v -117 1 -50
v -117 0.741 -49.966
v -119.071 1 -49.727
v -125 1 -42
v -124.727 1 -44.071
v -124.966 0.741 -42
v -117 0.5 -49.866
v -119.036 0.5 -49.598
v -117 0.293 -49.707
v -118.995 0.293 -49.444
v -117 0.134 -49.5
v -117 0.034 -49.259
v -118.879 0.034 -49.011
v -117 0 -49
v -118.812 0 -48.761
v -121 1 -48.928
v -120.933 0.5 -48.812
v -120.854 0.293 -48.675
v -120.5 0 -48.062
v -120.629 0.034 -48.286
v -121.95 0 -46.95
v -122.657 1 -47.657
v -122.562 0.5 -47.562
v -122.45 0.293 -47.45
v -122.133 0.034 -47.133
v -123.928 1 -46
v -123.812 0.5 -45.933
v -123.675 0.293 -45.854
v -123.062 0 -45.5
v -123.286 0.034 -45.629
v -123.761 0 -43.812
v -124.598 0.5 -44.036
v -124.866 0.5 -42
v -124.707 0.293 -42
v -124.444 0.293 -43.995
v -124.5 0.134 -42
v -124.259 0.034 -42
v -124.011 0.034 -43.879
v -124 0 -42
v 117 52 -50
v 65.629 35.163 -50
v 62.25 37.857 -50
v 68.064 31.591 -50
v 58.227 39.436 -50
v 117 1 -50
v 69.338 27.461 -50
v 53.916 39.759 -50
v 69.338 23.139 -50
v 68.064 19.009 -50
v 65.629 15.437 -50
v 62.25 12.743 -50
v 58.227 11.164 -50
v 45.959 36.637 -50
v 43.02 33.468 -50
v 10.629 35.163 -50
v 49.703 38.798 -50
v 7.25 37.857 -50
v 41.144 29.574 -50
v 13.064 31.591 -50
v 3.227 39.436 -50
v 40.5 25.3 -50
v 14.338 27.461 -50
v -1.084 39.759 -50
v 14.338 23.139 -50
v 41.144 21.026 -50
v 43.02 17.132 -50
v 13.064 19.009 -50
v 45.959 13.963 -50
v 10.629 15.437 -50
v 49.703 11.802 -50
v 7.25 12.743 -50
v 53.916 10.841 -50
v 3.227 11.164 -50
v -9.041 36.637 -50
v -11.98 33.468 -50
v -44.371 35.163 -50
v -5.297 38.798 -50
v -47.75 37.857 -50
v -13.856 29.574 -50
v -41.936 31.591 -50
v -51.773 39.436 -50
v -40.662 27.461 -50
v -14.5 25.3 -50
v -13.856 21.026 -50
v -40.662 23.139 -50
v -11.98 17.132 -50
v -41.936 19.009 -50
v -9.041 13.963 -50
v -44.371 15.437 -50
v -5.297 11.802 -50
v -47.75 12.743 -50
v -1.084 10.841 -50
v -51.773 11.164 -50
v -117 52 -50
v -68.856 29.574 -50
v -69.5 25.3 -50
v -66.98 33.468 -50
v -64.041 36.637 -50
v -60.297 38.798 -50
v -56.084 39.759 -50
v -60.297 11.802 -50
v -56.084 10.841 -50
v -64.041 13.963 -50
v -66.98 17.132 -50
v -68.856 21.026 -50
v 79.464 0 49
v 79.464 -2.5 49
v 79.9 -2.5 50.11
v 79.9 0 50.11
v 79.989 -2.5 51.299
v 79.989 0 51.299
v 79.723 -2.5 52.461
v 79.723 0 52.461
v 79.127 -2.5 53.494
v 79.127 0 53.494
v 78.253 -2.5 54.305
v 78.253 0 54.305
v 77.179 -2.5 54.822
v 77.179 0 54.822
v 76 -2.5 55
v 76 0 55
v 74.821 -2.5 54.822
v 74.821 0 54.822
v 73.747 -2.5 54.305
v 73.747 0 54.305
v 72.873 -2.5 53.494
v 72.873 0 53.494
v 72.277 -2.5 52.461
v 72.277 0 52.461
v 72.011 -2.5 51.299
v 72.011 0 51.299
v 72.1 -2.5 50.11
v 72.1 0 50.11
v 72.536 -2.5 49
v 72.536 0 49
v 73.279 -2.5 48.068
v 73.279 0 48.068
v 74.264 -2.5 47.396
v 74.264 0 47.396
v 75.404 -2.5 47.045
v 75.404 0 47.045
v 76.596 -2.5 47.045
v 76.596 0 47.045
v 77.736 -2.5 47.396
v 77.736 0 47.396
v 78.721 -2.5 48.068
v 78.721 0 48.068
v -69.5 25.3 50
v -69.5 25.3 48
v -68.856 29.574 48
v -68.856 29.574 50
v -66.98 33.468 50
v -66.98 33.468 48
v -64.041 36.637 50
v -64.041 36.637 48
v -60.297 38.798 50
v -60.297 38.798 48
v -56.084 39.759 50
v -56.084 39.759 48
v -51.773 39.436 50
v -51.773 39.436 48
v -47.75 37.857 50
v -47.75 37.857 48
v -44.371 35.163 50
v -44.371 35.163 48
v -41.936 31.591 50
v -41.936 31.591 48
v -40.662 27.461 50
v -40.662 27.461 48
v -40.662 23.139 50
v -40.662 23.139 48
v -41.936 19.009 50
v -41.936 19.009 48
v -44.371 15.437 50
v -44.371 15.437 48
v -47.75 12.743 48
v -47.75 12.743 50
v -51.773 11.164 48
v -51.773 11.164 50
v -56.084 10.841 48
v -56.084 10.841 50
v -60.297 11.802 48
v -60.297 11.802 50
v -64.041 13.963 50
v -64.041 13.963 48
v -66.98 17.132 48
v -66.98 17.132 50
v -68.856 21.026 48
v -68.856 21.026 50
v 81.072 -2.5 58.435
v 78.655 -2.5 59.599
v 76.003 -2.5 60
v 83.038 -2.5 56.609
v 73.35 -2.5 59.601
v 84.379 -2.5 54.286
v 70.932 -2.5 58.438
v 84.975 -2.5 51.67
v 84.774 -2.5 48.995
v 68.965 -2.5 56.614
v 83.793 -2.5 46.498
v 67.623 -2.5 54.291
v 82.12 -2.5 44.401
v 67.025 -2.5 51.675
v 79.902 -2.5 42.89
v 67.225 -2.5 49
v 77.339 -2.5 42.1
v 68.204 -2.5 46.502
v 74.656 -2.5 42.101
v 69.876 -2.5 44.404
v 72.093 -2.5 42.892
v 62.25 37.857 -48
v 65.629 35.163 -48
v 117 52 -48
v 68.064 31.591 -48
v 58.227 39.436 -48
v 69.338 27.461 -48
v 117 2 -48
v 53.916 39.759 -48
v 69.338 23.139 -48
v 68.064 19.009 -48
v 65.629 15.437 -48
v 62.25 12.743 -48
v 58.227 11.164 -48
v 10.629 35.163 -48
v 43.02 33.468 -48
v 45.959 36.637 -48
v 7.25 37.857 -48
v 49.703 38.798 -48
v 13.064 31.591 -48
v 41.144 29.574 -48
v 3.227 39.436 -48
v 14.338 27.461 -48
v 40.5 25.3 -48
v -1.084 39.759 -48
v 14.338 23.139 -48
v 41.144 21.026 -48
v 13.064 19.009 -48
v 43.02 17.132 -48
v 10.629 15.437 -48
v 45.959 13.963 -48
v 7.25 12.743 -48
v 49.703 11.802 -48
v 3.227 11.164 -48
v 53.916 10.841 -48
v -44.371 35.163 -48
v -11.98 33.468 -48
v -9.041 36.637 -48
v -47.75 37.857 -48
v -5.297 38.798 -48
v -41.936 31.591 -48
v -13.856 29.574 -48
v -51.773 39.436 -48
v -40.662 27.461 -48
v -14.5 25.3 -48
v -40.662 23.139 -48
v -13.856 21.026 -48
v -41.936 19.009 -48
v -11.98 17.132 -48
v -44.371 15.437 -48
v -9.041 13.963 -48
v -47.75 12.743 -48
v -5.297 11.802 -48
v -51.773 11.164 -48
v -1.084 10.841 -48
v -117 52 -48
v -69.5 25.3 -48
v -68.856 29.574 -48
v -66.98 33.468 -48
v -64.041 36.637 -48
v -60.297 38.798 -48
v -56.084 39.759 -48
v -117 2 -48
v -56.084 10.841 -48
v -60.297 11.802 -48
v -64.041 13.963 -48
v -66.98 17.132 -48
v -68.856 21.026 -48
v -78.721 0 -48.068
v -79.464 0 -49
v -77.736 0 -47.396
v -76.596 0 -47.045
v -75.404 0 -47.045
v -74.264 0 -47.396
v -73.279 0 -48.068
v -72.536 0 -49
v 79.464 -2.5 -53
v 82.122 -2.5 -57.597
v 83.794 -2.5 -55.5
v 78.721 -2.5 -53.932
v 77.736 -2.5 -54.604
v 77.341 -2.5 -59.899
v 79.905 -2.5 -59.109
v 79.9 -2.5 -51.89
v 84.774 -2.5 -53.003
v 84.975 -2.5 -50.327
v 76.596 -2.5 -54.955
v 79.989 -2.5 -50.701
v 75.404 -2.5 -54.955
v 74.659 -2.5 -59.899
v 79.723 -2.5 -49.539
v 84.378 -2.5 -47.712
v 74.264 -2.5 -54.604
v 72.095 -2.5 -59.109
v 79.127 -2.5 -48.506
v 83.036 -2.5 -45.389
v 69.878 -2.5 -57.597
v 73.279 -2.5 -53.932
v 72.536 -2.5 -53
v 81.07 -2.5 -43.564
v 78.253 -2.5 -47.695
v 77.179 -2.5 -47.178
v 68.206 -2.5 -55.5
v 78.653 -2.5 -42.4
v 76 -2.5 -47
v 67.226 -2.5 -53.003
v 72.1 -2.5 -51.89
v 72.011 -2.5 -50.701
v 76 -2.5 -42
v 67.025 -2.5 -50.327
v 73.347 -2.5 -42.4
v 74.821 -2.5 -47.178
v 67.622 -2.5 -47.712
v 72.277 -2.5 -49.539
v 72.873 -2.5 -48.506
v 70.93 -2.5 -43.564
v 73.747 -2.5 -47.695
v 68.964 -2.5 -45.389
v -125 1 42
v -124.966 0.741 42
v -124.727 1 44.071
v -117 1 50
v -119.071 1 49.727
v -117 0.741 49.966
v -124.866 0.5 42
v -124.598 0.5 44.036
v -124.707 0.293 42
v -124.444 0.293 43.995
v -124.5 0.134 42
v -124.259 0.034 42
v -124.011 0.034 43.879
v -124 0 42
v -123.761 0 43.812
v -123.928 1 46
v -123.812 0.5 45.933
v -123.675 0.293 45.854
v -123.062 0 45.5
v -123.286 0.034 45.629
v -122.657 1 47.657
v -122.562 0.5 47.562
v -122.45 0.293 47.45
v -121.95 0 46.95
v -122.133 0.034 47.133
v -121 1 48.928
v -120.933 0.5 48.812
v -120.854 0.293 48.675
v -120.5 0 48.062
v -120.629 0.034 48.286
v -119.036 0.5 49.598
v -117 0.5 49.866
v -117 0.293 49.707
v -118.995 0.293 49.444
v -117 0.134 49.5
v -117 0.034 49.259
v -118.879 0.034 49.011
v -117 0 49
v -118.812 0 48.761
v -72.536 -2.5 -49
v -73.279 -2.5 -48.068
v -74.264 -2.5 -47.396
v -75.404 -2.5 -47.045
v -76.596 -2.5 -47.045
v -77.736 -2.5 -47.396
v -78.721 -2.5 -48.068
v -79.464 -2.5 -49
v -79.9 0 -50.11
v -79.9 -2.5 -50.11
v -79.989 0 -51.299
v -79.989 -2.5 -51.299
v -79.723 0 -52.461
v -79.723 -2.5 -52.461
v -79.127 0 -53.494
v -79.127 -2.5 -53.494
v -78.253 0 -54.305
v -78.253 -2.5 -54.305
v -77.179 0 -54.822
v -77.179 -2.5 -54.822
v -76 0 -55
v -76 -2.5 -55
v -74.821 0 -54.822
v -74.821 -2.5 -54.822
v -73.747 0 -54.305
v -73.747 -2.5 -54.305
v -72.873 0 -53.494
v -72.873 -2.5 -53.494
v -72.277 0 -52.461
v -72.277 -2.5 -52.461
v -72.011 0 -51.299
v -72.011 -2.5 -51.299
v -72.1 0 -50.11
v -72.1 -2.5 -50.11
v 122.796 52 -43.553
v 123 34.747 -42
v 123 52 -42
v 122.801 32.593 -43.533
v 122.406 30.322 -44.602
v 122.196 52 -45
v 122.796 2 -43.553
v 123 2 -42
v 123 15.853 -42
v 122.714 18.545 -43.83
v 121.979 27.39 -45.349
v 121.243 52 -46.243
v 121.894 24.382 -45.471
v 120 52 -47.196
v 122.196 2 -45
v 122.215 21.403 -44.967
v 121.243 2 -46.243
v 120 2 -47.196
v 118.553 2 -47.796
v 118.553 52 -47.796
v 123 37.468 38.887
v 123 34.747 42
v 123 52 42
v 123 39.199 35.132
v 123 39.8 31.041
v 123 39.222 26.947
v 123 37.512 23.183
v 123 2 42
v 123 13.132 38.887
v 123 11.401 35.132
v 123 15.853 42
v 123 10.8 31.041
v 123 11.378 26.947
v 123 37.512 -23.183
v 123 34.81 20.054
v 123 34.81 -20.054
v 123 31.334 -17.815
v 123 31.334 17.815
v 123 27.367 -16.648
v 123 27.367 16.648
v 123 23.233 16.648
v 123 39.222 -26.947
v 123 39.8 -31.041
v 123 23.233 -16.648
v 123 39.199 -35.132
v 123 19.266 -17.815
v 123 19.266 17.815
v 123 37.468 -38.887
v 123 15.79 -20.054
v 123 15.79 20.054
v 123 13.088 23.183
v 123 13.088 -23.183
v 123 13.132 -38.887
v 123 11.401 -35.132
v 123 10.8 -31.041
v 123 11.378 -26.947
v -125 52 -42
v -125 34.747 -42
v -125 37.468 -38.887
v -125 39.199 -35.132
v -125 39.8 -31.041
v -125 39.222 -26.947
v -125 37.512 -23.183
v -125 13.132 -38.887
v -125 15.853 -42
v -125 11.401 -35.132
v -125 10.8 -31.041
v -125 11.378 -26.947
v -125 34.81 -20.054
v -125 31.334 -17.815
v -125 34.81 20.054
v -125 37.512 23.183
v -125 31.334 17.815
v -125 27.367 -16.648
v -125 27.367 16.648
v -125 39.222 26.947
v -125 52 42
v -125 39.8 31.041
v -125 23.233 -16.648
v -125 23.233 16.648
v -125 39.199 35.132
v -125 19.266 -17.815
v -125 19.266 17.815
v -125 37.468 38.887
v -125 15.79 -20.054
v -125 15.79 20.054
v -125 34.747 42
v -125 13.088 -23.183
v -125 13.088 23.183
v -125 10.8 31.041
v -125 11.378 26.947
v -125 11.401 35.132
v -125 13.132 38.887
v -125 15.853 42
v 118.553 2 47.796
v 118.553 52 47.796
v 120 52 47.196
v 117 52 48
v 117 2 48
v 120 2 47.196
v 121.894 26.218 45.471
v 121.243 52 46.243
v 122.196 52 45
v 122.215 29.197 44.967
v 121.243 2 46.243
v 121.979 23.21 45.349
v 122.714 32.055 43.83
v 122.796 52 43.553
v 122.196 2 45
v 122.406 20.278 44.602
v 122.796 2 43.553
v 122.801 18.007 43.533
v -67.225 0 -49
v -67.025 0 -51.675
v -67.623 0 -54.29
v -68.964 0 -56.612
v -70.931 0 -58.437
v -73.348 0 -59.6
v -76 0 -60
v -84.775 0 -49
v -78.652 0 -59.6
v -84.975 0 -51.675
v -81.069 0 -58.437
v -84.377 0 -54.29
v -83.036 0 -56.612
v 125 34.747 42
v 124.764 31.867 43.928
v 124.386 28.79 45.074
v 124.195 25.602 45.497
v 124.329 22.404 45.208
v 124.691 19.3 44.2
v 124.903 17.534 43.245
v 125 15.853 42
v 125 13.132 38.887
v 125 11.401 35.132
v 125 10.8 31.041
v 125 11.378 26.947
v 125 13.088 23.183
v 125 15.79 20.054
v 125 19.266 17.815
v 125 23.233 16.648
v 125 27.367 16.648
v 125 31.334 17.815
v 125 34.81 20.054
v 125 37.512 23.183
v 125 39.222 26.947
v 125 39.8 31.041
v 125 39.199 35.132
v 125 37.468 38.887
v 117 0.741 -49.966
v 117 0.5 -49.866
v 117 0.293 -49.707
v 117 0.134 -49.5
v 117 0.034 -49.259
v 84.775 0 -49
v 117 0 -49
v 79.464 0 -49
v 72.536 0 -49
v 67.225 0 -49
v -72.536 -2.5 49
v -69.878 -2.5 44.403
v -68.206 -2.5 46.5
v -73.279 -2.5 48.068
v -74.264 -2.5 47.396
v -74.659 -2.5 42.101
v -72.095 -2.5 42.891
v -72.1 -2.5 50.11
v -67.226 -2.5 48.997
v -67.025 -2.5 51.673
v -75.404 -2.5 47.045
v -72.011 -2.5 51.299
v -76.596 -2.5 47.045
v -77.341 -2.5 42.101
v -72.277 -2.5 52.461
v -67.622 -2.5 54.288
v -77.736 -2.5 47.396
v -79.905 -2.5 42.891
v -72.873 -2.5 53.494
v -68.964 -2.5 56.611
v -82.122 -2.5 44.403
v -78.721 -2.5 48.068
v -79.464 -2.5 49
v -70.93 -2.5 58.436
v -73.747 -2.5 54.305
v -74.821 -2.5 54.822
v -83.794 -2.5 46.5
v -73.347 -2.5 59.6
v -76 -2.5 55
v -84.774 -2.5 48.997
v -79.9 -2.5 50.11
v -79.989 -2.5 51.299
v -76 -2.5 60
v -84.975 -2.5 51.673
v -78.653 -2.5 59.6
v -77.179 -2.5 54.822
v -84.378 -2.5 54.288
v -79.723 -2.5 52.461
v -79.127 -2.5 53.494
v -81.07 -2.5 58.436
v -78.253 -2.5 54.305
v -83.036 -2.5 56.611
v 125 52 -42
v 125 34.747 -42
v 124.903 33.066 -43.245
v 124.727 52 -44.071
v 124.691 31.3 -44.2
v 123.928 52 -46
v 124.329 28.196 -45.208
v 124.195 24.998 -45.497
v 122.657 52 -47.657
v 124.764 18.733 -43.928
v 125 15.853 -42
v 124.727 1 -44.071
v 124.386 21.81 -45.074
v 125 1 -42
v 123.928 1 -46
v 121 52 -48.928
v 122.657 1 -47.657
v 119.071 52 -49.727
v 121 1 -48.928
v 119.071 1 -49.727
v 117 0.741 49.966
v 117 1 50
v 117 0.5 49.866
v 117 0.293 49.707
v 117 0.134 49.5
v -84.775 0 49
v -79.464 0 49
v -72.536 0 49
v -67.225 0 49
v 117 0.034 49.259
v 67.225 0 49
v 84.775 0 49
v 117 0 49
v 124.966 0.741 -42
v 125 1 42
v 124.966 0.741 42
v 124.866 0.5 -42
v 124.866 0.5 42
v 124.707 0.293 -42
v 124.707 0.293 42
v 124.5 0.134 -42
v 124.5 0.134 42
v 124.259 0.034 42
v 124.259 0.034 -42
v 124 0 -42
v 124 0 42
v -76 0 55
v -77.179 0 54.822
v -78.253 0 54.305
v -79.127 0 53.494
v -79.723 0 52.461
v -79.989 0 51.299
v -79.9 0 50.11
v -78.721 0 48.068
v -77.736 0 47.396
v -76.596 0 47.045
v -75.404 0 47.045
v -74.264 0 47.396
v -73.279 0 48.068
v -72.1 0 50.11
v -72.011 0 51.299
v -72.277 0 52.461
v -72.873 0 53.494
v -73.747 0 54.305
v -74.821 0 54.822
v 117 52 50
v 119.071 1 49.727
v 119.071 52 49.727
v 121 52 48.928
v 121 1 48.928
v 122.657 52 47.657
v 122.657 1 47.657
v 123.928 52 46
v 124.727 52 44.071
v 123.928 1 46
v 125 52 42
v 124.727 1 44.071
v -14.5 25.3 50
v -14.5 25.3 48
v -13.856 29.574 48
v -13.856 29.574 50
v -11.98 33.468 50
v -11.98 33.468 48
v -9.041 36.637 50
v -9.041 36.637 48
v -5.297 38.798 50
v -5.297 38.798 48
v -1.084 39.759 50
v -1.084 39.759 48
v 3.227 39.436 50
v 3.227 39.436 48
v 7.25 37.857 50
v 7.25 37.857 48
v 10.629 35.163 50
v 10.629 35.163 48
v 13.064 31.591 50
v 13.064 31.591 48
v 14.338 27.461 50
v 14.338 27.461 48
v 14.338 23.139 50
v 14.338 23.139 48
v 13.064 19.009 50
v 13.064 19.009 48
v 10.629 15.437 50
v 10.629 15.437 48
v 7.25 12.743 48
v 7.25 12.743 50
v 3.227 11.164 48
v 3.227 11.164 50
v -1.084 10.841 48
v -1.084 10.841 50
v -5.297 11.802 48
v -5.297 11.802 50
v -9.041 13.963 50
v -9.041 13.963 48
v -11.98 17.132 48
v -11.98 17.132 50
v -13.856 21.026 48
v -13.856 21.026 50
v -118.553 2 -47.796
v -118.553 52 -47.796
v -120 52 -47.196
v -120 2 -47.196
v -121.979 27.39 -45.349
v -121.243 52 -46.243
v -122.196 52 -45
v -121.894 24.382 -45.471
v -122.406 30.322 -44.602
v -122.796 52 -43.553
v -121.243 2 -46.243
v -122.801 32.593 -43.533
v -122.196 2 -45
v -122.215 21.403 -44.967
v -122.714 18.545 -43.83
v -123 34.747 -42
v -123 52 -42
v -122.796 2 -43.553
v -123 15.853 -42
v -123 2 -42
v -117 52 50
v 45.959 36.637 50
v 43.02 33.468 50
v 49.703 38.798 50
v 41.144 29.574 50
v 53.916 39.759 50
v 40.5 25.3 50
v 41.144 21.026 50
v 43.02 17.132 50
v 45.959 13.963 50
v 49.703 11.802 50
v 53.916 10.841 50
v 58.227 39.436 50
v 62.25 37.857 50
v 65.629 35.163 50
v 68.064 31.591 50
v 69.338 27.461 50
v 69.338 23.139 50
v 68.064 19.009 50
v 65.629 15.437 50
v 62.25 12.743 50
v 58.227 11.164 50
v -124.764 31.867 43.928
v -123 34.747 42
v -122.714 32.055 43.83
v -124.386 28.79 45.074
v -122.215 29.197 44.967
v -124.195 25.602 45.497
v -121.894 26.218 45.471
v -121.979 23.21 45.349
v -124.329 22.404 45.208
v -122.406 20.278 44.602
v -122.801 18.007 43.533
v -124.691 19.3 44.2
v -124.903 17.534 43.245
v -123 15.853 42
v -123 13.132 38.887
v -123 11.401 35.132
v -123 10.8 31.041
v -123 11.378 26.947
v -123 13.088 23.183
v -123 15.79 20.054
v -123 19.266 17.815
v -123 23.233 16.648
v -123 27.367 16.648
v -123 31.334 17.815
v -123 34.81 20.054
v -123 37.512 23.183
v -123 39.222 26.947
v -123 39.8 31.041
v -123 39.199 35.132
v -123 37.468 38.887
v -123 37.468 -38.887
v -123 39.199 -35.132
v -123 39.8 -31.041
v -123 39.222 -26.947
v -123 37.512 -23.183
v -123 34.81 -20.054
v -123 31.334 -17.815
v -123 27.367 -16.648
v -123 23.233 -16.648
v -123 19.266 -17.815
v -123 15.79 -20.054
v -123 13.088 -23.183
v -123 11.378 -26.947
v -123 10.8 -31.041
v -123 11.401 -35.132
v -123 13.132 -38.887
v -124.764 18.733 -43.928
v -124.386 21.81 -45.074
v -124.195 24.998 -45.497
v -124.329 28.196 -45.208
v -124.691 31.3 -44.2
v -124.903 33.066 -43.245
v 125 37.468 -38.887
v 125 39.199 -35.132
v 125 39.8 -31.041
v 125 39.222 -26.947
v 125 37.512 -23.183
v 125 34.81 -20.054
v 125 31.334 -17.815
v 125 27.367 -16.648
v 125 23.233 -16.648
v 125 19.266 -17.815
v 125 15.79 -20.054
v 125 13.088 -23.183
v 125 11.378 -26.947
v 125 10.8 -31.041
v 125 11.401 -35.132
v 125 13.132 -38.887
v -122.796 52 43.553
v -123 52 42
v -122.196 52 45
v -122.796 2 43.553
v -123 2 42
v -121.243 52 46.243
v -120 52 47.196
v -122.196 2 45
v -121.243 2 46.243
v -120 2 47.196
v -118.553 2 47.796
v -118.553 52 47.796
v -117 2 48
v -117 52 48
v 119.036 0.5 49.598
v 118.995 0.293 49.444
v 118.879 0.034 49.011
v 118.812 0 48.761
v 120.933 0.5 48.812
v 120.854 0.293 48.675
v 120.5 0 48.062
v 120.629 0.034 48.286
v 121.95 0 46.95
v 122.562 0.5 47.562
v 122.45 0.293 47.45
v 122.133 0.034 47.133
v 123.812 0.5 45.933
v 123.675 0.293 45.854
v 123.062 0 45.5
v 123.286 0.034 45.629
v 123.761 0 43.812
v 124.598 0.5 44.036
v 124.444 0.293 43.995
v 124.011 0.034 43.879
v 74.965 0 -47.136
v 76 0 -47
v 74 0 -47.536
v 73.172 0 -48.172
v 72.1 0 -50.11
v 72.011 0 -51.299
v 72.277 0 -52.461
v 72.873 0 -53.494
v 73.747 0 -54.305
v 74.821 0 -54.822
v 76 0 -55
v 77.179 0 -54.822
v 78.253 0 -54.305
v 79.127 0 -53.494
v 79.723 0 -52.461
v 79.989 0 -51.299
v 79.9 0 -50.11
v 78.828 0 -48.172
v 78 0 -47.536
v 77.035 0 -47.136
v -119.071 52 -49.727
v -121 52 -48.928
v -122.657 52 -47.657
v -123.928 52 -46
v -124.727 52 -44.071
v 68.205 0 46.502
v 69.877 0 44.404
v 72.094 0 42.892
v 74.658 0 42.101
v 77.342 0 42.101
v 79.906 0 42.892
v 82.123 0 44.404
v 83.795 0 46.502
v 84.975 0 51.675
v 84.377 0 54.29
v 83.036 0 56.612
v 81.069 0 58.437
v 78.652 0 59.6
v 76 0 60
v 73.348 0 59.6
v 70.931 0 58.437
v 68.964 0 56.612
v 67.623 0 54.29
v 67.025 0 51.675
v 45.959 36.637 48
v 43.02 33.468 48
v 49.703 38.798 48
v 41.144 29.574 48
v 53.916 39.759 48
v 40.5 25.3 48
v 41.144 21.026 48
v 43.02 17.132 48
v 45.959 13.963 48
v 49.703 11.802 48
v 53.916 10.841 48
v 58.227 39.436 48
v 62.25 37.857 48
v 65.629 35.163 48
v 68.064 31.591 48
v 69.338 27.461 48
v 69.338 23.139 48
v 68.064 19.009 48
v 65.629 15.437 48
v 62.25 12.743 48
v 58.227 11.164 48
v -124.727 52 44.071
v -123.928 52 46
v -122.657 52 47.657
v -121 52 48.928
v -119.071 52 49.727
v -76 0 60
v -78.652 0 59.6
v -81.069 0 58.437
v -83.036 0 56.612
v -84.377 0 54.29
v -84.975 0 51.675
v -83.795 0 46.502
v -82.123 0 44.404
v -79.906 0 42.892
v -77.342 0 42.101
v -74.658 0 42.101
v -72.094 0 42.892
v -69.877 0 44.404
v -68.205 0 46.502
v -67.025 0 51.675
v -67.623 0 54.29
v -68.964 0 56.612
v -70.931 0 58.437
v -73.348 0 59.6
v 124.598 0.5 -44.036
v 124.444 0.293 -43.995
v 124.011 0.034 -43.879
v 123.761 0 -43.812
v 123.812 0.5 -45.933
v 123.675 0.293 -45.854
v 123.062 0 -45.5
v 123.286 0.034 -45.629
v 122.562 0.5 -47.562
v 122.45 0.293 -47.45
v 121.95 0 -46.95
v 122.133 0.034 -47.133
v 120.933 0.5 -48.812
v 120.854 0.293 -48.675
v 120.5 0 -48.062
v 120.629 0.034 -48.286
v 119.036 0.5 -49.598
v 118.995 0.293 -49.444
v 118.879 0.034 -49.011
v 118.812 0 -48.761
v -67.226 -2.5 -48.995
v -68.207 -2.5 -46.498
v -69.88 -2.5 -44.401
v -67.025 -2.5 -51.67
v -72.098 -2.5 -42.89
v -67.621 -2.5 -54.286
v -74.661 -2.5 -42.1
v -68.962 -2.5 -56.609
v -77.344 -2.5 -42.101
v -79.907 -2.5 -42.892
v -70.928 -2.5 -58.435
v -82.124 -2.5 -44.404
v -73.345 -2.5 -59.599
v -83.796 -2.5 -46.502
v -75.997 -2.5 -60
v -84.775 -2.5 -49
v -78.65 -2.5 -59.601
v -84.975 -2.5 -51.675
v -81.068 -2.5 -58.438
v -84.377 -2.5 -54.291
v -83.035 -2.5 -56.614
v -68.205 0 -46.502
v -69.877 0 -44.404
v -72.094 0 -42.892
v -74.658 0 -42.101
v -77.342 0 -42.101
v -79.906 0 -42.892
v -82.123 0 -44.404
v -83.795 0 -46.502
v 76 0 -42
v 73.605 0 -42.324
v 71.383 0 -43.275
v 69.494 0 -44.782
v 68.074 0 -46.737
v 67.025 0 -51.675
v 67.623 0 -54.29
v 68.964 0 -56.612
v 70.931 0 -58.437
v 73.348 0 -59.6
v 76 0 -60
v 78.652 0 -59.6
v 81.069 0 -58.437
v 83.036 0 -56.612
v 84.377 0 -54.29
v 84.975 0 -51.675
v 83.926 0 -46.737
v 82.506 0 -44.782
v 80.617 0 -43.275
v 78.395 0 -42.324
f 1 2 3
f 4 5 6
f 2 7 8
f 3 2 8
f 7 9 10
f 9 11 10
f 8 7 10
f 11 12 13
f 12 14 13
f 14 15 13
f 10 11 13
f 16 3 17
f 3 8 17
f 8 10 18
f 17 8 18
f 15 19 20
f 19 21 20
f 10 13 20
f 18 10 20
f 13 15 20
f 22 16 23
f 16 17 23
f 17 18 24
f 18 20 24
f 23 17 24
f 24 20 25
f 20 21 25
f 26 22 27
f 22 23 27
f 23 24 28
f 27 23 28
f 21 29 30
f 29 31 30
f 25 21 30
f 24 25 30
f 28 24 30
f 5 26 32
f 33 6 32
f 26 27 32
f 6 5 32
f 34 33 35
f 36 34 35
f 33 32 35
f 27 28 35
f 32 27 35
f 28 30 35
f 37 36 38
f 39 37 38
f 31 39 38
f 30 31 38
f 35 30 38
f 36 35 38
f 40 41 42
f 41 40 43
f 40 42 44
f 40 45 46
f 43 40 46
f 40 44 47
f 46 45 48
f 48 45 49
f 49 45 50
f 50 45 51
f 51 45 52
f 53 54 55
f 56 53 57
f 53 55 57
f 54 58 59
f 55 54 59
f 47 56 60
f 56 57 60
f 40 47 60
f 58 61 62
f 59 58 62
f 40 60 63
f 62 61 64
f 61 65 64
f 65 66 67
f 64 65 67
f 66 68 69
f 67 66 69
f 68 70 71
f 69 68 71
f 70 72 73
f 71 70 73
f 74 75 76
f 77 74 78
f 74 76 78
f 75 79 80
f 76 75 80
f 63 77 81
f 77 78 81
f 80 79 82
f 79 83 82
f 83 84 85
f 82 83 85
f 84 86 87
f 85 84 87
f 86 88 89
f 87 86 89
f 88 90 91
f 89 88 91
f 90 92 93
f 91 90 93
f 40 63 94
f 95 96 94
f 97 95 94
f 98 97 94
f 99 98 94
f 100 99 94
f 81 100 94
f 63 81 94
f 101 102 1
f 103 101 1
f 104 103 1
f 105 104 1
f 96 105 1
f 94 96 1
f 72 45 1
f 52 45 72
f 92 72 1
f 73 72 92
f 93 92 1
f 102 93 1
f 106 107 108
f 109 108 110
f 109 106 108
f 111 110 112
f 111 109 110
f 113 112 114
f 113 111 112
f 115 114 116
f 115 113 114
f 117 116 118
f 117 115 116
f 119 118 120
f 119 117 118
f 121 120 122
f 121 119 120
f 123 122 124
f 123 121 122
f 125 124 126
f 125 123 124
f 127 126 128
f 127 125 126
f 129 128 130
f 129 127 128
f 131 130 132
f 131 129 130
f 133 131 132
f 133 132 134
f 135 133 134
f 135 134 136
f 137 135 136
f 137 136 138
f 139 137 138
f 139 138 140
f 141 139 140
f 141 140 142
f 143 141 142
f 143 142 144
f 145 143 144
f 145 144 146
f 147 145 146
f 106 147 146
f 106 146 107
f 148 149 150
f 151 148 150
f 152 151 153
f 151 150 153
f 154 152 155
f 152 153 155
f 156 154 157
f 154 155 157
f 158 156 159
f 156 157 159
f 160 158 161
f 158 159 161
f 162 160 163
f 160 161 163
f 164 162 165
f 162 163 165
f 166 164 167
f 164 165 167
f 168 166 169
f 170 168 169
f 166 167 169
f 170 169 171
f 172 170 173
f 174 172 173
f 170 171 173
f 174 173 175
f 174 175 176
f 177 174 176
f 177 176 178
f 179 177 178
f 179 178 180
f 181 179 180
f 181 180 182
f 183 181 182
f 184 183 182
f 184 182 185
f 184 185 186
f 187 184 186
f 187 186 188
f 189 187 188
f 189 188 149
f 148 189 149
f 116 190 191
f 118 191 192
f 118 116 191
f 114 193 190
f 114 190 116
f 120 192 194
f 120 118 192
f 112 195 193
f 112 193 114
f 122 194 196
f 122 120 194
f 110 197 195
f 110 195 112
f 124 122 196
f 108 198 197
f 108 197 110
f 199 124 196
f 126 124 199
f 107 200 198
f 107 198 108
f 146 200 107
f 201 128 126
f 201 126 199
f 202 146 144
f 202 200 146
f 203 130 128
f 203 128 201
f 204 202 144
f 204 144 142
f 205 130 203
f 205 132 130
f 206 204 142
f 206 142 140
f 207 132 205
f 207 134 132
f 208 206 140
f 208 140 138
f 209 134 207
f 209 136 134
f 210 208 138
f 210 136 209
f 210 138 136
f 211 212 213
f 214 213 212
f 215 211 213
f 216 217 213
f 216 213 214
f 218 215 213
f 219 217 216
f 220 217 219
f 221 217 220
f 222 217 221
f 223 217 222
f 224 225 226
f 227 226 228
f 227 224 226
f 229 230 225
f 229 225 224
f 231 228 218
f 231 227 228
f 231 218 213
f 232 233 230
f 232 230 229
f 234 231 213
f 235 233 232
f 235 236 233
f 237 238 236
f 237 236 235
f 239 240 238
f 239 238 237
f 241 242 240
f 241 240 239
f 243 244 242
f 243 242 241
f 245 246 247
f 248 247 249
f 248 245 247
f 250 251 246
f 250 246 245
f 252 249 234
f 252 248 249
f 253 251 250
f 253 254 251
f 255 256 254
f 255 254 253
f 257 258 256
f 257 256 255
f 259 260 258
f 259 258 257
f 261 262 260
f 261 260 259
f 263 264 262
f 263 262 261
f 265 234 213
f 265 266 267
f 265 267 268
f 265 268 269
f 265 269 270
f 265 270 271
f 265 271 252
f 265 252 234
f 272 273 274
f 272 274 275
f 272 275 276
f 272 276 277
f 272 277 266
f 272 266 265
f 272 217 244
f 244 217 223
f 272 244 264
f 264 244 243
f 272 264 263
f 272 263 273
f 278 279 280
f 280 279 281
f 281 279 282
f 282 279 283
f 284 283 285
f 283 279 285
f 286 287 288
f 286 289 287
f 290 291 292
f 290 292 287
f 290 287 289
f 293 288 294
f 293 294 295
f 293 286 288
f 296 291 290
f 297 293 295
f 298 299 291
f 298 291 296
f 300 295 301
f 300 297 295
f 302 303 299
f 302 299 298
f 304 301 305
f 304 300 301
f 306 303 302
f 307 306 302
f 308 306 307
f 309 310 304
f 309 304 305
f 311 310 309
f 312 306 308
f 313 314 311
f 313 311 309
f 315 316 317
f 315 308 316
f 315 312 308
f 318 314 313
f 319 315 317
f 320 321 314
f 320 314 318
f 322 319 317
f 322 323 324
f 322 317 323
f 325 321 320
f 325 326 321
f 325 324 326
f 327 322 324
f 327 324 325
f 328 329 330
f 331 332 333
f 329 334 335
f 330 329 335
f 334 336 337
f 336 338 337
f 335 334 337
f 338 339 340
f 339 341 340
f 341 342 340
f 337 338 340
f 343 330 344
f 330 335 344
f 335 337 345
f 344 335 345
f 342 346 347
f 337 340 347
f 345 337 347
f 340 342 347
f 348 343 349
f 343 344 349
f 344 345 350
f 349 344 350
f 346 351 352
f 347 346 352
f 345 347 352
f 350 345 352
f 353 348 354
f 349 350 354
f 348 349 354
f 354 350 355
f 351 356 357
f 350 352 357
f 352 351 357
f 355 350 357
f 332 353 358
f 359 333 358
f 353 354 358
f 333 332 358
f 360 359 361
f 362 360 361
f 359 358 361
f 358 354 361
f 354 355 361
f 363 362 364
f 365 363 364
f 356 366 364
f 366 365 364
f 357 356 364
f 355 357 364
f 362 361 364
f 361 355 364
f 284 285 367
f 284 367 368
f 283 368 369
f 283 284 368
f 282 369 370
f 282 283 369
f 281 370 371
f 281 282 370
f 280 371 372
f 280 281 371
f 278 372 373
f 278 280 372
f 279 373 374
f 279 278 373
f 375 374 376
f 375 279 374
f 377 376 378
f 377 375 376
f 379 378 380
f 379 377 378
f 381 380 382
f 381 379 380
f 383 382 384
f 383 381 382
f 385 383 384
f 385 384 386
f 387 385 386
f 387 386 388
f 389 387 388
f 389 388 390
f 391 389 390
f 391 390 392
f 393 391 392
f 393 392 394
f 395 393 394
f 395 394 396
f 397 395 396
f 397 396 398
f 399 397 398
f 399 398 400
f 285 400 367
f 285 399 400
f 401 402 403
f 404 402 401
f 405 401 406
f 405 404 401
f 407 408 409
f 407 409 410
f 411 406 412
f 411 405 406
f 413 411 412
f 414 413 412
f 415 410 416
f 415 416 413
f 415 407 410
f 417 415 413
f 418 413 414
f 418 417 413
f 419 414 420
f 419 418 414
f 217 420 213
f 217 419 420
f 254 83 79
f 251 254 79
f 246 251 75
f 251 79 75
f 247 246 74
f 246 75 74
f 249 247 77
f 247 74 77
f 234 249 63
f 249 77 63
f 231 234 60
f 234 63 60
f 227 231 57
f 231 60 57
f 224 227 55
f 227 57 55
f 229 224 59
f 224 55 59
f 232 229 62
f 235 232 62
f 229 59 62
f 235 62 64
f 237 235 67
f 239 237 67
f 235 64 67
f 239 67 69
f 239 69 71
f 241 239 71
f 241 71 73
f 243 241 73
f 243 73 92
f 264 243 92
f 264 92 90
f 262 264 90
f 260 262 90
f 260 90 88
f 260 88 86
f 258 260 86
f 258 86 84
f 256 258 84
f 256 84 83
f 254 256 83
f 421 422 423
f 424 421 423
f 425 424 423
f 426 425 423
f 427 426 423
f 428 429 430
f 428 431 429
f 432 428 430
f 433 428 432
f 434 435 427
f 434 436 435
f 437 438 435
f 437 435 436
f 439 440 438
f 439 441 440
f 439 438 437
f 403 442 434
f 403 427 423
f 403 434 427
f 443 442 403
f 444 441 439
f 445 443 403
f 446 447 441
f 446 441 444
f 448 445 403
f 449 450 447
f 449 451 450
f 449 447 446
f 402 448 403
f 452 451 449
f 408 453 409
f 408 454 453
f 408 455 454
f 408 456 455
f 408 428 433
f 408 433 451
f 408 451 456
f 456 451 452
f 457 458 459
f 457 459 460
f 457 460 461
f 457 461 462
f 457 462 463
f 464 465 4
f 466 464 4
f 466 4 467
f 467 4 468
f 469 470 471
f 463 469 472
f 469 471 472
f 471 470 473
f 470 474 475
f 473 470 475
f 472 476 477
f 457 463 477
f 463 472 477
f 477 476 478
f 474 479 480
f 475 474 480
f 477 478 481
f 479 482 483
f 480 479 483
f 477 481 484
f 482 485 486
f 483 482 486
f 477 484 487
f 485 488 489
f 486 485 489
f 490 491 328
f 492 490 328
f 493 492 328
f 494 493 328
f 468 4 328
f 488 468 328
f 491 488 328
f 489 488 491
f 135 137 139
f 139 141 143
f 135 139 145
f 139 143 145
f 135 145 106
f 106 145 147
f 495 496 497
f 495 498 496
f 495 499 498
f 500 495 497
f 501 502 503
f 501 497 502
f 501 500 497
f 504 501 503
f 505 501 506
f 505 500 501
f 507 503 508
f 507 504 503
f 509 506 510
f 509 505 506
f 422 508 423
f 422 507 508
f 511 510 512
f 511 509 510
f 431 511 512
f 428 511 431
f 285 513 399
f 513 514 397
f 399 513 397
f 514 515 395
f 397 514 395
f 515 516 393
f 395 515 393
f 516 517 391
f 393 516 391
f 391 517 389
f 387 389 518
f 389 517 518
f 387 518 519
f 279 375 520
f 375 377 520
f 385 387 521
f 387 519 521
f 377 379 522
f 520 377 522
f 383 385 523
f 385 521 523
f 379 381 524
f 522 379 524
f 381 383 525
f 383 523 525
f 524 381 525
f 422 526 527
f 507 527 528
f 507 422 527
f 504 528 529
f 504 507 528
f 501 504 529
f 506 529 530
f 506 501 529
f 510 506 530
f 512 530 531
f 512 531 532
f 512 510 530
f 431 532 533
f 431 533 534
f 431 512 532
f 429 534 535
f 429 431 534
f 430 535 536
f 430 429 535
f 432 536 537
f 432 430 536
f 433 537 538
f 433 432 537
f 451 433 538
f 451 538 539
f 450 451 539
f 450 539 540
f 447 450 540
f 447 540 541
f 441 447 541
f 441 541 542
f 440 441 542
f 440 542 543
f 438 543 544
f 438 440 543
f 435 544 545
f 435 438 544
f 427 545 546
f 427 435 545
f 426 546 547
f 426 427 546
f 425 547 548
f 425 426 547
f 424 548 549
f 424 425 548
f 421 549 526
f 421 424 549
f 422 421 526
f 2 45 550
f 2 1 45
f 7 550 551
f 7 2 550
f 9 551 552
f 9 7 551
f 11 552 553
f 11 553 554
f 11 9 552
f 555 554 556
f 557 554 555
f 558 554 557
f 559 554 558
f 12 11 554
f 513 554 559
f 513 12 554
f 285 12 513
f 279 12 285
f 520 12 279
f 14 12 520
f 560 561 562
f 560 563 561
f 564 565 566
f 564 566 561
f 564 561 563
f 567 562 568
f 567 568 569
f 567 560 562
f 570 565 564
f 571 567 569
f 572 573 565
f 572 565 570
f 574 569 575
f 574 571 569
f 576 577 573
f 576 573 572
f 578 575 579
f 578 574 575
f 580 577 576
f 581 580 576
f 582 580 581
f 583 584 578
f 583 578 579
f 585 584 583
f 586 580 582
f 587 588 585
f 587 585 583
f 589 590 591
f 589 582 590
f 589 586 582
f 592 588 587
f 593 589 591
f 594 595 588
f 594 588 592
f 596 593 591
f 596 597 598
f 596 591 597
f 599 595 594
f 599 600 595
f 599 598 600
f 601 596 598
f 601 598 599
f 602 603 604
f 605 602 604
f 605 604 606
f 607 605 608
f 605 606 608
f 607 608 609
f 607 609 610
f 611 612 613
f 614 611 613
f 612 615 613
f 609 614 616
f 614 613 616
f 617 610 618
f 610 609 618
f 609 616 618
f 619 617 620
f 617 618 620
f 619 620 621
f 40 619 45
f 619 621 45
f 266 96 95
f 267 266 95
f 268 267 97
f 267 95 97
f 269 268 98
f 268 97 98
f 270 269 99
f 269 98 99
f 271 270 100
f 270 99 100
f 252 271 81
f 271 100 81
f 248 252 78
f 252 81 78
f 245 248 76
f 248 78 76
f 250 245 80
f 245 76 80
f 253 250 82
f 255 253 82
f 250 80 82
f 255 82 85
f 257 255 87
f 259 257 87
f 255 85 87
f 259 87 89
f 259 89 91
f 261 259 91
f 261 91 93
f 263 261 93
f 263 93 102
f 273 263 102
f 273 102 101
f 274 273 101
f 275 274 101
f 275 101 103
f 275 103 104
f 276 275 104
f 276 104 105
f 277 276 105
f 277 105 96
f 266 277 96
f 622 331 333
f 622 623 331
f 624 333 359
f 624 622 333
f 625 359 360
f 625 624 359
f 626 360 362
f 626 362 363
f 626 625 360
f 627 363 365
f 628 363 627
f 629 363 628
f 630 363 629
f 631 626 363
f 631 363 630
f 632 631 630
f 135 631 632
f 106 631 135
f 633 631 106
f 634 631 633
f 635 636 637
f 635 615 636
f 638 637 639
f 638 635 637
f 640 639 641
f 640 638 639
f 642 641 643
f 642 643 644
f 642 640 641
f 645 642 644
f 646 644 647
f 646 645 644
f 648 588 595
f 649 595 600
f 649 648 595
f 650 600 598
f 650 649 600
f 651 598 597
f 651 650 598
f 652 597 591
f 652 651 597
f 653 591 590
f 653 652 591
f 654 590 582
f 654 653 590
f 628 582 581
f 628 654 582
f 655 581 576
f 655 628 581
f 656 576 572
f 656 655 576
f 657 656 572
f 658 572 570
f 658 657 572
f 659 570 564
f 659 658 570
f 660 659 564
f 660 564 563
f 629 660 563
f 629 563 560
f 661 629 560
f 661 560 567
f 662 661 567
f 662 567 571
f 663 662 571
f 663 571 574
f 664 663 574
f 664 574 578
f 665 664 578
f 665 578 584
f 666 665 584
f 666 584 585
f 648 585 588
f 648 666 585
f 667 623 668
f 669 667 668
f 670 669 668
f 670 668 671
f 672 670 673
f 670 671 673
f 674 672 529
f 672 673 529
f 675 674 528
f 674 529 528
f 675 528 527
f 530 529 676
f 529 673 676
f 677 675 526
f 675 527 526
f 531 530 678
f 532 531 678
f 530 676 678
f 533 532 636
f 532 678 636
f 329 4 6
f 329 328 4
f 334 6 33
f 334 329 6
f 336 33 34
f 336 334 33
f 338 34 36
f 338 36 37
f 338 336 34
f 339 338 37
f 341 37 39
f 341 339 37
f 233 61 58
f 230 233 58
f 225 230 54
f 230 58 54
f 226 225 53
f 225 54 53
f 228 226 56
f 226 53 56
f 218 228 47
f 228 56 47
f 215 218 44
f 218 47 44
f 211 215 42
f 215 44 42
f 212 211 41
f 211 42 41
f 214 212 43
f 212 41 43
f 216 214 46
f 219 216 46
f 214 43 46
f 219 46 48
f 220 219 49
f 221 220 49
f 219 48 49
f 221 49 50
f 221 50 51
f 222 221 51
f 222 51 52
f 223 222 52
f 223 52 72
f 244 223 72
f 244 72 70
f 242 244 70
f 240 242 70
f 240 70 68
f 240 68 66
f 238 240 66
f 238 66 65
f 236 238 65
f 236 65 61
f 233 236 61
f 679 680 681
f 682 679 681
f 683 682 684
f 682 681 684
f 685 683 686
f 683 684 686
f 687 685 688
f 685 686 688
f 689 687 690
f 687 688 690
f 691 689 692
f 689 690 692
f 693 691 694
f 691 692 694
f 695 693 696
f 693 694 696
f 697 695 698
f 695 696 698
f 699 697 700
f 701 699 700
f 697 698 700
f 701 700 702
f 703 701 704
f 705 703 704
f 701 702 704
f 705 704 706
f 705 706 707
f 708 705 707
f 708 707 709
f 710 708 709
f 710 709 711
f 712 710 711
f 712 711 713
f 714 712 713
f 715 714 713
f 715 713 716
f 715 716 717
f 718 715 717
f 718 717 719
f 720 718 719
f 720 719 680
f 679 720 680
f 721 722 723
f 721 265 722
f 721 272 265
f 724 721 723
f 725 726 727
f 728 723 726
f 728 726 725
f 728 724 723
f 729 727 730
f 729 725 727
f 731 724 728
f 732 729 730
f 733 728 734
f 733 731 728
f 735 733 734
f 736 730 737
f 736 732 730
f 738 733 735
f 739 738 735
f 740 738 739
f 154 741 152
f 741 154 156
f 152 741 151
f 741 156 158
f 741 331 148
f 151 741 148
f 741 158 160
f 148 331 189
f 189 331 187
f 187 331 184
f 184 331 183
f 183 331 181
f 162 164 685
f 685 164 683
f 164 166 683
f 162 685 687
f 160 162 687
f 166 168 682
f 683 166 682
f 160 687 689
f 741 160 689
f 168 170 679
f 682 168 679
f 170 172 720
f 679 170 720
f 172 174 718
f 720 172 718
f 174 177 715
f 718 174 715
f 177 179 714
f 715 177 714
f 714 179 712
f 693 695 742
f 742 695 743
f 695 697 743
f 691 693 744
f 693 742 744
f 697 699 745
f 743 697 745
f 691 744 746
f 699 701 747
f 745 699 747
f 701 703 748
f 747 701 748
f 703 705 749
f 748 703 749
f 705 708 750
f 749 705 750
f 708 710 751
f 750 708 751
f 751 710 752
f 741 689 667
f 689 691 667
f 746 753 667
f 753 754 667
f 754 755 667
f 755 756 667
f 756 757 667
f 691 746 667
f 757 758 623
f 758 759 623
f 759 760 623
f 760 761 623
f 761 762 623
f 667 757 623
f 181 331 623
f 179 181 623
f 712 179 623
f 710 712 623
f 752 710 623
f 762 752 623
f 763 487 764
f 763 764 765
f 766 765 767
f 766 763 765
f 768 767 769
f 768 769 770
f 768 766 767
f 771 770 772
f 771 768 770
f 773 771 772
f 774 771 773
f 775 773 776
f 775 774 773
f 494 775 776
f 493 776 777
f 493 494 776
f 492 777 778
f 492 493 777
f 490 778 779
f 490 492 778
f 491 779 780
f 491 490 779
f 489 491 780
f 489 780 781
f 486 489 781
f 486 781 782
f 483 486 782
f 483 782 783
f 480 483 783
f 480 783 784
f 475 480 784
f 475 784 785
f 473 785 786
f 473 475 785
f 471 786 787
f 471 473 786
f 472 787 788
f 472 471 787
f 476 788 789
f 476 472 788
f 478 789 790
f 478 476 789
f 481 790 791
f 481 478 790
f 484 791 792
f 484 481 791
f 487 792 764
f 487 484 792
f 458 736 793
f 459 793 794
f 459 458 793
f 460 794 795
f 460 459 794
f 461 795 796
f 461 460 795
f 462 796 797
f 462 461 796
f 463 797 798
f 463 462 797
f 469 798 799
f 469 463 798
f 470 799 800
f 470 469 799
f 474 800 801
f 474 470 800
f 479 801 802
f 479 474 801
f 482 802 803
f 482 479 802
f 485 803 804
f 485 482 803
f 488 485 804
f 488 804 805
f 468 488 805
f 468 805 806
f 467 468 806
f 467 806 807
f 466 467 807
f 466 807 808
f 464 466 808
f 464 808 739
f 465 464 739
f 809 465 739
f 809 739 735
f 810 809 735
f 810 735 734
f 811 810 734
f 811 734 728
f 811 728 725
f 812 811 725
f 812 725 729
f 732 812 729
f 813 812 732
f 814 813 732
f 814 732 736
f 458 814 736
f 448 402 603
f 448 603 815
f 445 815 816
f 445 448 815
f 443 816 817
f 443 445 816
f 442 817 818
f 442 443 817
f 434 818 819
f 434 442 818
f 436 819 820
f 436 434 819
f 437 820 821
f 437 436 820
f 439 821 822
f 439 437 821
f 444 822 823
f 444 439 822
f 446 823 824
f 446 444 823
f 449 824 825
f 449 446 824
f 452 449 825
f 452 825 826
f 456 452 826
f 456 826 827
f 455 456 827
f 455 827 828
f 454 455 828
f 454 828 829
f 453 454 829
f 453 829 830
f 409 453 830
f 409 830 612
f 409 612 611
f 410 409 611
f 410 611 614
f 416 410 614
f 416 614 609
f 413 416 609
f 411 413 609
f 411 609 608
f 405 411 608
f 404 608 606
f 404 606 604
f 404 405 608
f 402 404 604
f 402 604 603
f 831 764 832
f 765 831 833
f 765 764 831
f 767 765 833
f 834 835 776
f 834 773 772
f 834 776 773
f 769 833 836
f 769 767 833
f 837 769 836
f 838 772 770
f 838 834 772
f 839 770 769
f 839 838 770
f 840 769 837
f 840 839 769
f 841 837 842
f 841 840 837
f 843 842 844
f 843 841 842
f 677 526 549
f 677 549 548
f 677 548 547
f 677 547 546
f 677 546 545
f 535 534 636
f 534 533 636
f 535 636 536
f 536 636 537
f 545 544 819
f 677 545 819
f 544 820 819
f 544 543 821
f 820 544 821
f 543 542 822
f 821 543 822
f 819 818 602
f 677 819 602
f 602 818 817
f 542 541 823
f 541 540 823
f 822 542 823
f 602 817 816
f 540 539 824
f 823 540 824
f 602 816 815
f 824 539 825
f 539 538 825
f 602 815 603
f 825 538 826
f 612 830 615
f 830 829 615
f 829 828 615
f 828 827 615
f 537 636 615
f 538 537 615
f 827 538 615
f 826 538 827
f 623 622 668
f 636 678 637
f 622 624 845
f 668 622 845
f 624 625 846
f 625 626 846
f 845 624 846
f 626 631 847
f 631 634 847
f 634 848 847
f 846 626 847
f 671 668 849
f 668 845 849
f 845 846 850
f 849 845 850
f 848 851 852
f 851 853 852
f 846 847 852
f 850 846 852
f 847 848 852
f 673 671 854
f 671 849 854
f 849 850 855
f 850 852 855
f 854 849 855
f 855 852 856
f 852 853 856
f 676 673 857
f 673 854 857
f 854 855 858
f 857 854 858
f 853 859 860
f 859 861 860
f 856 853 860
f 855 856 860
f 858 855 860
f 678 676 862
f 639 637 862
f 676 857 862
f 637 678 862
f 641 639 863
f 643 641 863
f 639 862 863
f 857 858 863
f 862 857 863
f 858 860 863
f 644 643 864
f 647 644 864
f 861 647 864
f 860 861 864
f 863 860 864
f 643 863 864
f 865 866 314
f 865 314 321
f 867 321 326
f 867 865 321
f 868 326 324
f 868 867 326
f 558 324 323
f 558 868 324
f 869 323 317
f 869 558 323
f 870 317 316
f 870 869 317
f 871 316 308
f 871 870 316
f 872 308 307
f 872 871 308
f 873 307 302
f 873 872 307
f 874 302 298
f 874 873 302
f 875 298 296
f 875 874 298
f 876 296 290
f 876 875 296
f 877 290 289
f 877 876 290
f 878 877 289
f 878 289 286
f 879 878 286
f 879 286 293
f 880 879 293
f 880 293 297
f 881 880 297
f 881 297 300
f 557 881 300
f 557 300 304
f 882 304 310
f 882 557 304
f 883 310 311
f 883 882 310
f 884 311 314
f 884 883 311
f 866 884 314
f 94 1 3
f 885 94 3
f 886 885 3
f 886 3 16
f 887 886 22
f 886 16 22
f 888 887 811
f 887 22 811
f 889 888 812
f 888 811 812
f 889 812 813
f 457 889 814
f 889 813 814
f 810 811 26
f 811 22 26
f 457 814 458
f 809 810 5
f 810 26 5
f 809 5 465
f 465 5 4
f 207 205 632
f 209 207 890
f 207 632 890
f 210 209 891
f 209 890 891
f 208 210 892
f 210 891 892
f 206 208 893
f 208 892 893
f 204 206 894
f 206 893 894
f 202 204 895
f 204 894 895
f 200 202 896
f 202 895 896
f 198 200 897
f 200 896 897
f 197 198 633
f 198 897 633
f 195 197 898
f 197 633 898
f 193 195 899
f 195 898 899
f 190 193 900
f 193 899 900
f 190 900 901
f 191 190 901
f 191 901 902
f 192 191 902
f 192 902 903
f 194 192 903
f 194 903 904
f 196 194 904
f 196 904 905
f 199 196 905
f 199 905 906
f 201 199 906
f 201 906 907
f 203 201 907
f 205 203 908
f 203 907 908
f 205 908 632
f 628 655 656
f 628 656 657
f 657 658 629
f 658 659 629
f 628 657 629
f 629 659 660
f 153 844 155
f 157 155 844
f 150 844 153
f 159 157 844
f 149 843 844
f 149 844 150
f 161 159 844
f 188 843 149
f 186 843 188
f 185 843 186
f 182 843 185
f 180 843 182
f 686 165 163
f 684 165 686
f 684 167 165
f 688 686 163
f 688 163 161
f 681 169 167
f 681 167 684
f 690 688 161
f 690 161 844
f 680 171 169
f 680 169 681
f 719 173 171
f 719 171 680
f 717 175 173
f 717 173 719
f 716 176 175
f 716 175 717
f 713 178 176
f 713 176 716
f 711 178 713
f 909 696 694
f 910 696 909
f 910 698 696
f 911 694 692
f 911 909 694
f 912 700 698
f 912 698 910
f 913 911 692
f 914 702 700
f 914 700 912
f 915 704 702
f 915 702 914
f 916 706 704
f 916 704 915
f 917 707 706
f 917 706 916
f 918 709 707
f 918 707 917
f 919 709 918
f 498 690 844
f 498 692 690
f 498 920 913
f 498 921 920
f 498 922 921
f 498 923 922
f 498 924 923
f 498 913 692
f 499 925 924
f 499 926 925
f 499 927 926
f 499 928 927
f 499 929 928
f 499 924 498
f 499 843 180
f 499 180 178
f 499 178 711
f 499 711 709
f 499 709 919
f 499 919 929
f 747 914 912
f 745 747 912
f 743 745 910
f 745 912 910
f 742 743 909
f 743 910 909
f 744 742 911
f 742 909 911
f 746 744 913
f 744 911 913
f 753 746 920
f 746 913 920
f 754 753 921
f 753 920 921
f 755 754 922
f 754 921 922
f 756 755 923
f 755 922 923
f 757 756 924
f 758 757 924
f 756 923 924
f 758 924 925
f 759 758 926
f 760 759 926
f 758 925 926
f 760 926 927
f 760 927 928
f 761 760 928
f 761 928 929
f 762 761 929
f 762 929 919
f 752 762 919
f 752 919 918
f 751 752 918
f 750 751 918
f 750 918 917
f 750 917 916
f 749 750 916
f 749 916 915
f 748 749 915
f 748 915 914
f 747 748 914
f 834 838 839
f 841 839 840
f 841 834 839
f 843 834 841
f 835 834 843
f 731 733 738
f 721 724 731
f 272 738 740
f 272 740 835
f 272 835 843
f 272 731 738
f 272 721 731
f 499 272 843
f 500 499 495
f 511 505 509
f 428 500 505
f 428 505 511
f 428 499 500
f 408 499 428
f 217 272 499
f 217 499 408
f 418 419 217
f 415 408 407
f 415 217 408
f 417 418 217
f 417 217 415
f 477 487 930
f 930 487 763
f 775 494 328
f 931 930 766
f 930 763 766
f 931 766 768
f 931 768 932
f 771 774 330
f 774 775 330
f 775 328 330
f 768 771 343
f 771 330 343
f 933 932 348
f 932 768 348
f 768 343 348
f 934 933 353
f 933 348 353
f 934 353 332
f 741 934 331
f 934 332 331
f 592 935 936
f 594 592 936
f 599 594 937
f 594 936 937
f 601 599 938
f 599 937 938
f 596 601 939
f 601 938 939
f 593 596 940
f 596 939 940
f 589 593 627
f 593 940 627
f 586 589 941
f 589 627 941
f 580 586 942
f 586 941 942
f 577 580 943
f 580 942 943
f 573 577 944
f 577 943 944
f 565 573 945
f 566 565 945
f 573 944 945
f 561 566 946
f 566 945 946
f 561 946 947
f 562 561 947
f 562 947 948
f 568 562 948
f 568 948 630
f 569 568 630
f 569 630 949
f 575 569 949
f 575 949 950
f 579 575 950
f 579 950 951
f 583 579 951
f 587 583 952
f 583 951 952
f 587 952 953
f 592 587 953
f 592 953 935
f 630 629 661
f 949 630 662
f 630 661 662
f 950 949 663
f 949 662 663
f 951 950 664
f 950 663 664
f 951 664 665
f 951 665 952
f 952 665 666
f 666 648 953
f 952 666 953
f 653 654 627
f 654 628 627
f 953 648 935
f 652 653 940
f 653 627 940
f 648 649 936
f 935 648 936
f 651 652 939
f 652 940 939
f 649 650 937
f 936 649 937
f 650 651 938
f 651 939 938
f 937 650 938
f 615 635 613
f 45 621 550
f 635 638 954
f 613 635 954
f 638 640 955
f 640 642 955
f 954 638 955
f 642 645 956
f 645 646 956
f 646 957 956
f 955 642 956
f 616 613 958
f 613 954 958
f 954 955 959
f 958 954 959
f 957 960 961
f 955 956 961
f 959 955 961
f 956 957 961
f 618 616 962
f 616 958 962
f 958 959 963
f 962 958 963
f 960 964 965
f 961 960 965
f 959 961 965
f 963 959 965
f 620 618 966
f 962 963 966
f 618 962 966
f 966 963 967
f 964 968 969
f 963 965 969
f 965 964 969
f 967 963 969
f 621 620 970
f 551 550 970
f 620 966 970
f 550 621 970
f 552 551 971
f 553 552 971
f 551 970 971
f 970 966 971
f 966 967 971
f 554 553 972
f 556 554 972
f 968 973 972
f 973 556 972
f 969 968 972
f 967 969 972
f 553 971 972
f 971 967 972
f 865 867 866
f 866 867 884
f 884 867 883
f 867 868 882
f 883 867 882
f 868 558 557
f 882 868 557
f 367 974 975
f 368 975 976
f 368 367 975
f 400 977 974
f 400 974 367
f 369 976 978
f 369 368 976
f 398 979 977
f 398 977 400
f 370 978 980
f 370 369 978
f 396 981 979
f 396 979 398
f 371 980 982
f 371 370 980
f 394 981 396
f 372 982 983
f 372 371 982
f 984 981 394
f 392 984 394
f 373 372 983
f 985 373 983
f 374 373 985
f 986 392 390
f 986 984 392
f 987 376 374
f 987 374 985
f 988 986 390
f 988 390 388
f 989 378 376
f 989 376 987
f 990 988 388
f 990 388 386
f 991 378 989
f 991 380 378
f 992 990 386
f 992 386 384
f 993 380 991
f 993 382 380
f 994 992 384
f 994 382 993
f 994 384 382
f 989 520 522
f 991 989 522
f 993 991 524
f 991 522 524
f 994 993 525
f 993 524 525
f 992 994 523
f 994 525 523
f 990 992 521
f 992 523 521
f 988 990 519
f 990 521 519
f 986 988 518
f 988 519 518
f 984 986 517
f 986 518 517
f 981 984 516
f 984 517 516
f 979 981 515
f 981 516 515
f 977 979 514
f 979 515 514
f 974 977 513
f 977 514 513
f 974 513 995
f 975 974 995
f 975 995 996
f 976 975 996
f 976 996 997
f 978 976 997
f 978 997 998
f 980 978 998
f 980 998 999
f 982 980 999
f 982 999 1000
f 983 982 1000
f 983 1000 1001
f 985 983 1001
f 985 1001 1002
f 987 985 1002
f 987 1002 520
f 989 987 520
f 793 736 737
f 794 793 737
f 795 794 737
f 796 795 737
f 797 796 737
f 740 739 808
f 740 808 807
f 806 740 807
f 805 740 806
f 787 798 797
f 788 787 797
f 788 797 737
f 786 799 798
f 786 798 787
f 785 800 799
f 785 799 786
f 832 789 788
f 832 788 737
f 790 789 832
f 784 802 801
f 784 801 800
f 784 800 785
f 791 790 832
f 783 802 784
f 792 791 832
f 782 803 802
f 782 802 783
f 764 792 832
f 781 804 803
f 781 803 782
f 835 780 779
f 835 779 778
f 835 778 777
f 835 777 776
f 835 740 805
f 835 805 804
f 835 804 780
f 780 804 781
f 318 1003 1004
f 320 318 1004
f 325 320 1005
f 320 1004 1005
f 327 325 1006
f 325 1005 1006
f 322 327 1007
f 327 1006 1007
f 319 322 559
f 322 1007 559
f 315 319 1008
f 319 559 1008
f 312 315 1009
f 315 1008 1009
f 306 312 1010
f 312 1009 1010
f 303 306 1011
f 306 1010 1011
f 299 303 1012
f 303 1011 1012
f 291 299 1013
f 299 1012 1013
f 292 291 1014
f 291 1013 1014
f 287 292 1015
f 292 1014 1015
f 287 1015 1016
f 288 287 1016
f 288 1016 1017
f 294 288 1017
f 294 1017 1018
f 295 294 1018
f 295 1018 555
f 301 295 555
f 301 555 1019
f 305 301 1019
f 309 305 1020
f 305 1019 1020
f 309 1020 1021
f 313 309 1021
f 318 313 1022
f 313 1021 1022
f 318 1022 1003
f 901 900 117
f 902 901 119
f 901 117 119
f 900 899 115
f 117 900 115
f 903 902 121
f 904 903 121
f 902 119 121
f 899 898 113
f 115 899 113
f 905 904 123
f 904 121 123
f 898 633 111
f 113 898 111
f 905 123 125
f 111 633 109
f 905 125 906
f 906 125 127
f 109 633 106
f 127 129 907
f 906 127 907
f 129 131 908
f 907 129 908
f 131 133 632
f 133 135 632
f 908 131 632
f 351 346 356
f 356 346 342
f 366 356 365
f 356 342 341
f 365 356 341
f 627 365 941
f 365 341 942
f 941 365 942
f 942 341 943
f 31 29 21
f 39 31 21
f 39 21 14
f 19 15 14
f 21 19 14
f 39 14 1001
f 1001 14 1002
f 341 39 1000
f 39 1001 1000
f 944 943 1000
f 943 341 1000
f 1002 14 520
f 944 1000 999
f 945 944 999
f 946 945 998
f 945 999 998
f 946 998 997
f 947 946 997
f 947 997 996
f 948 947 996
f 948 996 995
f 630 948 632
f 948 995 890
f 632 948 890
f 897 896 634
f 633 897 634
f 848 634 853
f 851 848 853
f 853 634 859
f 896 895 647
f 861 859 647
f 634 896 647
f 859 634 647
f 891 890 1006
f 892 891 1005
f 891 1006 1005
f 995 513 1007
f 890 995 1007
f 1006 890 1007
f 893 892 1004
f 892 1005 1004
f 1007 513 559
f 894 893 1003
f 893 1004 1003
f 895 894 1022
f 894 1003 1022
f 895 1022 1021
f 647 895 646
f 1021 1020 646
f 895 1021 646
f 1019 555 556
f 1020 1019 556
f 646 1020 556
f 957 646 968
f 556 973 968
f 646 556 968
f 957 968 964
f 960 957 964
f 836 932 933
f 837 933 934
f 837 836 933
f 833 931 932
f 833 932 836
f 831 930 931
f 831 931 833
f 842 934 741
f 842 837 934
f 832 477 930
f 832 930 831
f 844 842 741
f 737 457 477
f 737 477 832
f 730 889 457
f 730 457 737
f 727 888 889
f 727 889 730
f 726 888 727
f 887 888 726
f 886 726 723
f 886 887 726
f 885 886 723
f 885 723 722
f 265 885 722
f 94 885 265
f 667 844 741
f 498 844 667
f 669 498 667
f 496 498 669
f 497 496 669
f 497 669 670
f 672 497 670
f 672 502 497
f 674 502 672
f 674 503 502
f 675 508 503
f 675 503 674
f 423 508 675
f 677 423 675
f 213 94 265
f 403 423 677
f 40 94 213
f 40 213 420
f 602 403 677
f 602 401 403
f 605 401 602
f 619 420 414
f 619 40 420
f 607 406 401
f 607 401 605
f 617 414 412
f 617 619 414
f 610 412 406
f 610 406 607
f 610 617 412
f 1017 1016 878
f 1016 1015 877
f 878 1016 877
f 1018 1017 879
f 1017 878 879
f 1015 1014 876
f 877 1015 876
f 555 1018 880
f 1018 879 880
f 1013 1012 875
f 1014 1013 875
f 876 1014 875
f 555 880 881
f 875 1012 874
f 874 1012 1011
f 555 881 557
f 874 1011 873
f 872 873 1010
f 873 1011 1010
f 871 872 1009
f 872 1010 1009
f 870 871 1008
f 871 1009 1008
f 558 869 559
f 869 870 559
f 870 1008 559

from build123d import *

# Parameters (mm, degrees)
BOSS_EXTRUDE1_DEPTH     = 52
FILLET1_R               = 1
SHELL1_T                = -2
SKETCH2_R               = 9
SKETCH2_R_2             = 4
BOSS_EXTRUDE2_DEPTH     = 2.5
SKETCH3_R               = 14.5
CUT_EXTRUDE1_DEPTH      = 175.439101121
CUT_EXTRUDE2_DEPTH      = 149.084435374
CUT_EXTRUDE2_DEPTH_BACK = 149.084435374
SKETCH4_R               = 14.5


with BuildPart() as part:
    # Sketch1 → Boss-Extrude1 (new body)
    with BuildSketch(Plane(origin=(0, 0, 0), x_dir=(1, 0, 0), z_dir=(0, 1, 0))):
        with BuildLine():
            Line((125, -42), (125, 42))
            ThreePointArc((125, 42), (122.656854249, 47.656854249), (117, 50))
            Line((117, 50), (-117, 50))
            ThreePointArc((-117, 50), (-122.656854249, 47.656854249), (-125, 42))
            Line((-125, 42), (-125, -42))
            ThreePointArc((-125, -42), (-122.656854249, -47.656854249), (-117, -50))
            Line((-117, -50), (117, -50))
            ThreePointArc((117, -50), (122.656854249, -47.656854249), (125, -42))
        make_face()
    extrude(amount=BOSS_EXTRUDE1_DEPTH)

    # Fillet1
    fillet1_edges = [part.edges().sort_by_distance(p)[0] for p in [
        (0, 0, -50),
        (122.656854249, 0, -47.656854249),
        (125, 0, 0),
        (122.656854249, 0, 47.656854249),
        (0, 0, 50),
        (-122.656854249, 0, 47.656854249),
        (-125, 0, 0),
        (-122.656854249, 0, -47.656854249),
    ]]
    fillet(fillet1_edges, radius=FILLET1_R)

    # Shell1
    shell1_openings = [part.faces().sort_by_distance(p)[0] for p in [
        (0, 52, 0),
    ]]
    offset(amount=SHELL1_T, openings=shell1_openings, kind=Kind.INTERSECTION)

    # Sketch2 → Boss-Extrude2 (add)
    # profile 1 of 4: a face of its own
    with BuildSketch(Plane.XZ):
        with Locations(Location((76, 51, 0), (0, 0, 192.839588407))):
            Circle(SKETCH2_R)
        with Locations(Location((76, 51, 0), (0, 0, 330))):
            Circle(SKETCH2_R_2, mode=Mode.SUBTRACT)
    # profile 2 of 4: a face of its own
    with BuildSketch(Plane.XZ):
        with Locations(Location((76, -51, 0), (0, 0, 90))):
            Circle(SKETCH2_R)
        with Locations(Location((76, -51, 0), (0, 0, 90))):
            Circle(SKETCH2_R_2, mode=Mode.SUBTRACT)
    # profile 3 of 4: a face of its own
    with BuildSketch(Plane.XZ):
        with Locations(Location((-76, -51, 0), (0, 0, 167.160411593))):
            Circle(SKETCH2_R)
        with Locations(Location((-76, -51, 0), (0, 0, 30))):
            Circle(SKETCH2_R_2, mode=Mode.SUBTRACT)
    # profile 4 of 4: a face of its own
    with BuildSketch(Plane.XZ):
        with Locations(Location((-76, 51, 0), (0, 0, 90))):
            Circle(SKETCH2_R)
        with Locations(Location((-76, 51, 0), (0, 0, 90))):
            Circle(SKETCH2_R_2, mode=Mode.SUBTRACT)
    extrude(amount=BOSS_EXTRUDE2_DEPTH)

    # Sketch3 → Cut-Extrude1 (cut, through all)
    with BuildSketch(Plane(origin=(0, 0, -50), x_dir=(-1, 0, 0), z_dir=(0, 0, -1))):
        with Locations((-55, 25.3)):
            Circle(SKETCH3_R)
        with Locations((0, 25.3)):
            Circle(SKETCH3_R)
        with Locations((55, 25.3)):
            Circle(SKETCH3_R)
    extrude(amount=-CUT_EXTRUDE1_DEPTH, mode=Mode.SUBTRACT)

    # Sketch4 → Cut-Extrude2 (cut, two sides: drawn at the far end of the back side and taken through both)
    with BuildSketch(Plane(origin=(0, 0, 0), x_dir=(0, 0, -1), z_dir=(1, 0, 0)).offset(-CUT_EXTRUDE2_DEPTH_BACK)):
        with Locations(Location((31, 25.3, 0), (0, 0, 40.657248638))):
            Circle(SKETCH4_R)
        with Locations(Location((-31, 25.3, 0), (0, 0, 139.342751362))):
            Circle(SKETCH4_R)
    extrude(amount=CUT_EXTRUDE2_DEPTH + CUT_EXTRUDE2_DEPTH_BACK, mode=Mode.SUBTRACT)


solid = part.part
